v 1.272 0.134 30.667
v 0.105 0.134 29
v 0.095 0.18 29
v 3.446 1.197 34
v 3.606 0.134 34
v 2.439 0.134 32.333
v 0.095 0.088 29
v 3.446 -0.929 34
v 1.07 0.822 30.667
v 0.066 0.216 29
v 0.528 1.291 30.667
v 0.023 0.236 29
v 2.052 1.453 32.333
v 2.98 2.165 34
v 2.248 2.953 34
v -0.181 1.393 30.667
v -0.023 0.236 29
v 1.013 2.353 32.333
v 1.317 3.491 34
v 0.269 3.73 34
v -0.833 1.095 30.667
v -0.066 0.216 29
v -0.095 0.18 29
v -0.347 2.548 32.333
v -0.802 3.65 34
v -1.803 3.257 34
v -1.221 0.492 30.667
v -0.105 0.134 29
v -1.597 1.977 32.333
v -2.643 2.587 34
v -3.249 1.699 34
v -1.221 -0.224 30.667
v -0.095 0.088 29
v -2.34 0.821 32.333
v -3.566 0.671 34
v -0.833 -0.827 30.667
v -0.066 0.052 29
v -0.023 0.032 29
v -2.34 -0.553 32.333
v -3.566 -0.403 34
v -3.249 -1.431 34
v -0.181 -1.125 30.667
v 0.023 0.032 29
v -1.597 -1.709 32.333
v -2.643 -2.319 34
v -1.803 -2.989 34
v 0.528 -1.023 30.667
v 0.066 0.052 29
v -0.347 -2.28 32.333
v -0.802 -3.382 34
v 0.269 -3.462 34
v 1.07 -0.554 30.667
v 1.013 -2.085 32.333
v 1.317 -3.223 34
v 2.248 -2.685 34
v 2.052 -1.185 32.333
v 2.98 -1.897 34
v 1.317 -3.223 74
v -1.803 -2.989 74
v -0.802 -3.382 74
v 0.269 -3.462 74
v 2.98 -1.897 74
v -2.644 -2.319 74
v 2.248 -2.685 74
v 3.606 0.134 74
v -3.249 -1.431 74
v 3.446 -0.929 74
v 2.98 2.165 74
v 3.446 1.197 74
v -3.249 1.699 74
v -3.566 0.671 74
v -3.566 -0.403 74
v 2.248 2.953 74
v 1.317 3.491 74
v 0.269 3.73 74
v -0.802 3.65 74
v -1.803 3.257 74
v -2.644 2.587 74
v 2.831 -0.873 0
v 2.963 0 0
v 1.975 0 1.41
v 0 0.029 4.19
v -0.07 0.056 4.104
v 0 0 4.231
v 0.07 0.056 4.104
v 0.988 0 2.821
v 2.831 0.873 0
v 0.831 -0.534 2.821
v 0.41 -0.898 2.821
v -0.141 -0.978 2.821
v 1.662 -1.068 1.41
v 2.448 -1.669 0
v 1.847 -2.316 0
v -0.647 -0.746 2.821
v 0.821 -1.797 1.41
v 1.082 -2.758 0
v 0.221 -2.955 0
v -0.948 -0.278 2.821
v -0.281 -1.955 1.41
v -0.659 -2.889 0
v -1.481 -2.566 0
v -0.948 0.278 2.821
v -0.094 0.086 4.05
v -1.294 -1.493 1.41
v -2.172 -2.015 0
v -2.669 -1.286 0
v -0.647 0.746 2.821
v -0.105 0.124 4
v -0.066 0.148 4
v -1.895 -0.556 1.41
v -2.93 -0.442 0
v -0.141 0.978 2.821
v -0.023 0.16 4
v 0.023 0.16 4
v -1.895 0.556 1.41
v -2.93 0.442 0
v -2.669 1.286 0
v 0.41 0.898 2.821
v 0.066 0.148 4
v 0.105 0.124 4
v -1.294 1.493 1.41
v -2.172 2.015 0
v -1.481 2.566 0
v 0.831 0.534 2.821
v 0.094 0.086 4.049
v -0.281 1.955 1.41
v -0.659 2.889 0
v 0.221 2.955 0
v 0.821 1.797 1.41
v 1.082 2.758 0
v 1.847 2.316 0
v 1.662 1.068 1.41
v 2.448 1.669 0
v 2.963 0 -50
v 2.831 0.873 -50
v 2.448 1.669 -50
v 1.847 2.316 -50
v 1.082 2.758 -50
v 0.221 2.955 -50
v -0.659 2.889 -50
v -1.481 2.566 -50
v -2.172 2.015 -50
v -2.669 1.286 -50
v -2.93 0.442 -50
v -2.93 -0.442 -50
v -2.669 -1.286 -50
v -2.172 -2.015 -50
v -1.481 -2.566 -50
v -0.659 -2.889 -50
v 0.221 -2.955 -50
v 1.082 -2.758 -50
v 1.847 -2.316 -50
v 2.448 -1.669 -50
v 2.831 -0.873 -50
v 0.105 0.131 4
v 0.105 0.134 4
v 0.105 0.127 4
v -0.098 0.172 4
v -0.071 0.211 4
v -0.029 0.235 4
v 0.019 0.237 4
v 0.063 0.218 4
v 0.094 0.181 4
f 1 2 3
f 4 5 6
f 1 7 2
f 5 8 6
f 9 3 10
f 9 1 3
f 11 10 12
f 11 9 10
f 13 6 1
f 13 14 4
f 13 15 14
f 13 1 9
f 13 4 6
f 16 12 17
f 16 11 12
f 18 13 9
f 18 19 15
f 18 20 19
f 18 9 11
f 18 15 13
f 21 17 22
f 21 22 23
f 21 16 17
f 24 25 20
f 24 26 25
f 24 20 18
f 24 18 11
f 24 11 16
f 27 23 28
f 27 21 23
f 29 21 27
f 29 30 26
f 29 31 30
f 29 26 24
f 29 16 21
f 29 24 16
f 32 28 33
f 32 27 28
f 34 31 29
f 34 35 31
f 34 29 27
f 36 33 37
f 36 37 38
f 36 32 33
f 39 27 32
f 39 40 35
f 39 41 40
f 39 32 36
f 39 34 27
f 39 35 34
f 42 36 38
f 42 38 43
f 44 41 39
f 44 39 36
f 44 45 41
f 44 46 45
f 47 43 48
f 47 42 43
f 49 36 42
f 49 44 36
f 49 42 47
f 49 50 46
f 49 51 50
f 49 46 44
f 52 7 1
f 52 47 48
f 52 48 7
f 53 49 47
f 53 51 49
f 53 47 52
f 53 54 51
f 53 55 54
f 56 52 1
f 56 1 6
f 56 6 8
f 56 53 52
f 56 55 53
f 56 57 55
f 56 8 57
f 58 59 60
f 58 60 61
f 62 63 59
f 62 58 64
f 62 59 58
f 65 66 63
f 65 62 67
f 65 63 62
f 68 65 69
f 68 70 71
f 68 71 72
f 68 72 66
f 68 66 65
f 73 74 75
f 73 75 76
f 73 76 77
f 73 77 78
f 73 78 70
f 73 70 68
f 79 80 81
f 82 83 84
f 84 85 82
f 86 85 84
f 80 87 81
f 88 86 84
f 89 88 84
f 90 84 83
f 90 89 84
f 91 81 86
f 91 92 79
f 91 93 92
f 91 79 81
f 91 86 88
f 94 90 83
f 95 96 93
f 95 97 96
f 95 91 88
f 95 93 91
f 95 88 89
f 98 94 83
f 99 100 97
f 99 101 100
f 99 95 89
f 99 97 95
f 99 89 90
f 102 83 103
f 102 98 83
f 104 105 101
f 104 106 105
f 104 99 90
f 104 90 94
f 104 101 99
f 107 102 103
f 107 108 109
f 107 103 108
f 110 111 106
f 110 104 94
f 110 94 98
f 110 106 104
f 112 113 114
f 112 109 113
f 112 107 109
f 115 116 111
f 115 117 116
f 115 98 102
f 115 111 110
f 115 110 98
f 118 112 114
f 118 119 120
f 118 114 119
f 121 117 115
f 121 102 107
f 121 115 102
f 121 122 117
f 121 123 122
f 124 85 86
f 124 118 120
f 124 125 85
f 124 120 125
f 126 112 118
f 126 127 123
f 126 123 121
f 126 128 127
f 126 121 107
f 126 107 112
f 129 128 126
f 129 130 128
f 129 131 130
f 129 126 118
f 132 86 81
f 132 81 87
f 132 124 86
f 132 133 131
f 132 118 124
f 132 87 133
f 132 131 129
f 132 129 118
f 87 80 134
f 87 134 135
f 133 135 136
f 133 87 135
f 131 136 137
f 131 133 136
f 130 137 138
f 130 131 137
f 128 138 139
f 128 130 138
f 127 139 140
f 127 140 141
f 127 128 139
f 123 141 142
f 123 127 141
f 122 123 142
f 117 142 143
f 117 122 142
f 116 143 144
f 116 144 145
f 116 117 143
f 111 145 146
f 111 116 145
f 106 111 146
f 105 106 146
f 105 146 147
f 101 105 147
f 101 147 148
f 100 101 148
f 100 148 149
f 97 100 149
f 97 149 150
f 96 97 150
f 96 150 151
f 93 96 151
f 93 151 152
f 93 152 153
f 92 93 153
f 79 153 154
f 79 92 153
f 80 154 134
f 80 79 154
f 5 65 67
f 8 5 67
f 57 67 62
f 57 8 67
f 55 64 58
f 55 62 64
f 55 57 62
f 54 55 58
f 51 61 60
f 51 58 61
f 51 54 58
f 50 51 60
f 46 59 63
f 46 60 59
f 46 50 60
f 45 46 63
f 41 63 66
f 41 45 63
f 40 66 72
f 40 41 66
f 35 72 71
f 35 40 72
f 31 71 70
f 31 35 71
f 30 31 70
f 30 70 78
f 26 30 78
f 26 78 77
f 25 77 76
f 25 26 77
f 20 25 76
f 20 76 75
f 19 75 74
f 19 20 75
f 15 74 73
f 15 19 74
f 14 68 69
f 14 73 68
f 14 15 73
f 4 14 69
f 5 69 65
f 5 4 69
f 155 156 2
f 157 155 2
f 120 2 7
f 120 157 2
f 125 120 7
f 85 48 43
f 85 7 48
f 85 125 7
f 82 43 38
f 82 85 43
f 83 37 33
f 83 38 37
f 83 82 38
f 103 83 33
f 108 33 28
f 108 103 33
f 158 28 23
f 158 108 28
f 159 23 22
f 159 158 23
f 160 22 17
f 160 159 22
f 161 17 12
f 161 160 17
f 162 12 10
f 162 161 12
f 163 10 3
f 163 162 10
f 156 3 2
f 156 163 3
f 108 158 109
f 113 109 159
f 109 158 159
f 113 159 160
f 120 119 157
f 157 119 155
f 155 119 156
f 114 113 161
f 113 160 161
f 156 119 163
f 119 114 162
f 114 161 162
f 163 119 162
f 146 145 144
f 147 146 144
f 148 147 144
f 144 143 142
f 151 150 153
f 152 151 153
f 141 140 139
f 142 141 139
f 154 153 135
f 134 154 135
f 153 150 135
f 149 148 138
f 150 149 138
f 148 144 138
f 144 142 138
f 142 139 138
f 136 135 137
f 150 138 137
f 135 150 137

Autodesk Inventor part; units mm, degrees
ref_plane "YZ Plane" through (0, 0, 0) normal (1, 0, 0) x (0, 1, 0)
ref_plane "XZ Plane" through (0, 0, 0) normal (0, 1, 0) x (-1, 0, 0)
ref_plane "XY Plane" through (0, 0, 0) normal (0, 0, 1) x (1, 0, 0)
sketch "Sketch1" plane through (0, 0, 0) normal (0, 0, 1) x (1, 0, 0)
  circle A0 centre (0, 0) radius 2.9629 projected
  point P0 (0, 0)
extrude "Extrusion1" add sketch "Sketch1" against normal blind 50
sketch "Sketch2" plane through (0, 0, 0) normal (0, 0, 1) x (1, 0, 0)
  circle A0 centre (0, 0) radius 2.9629 projected
  point P0 (0, 0)
extrude "Extrusion2" add sketch "Sketch2" along normal blind 50 draft -35
ref_plane "Work Plane1" through (0, 0, 4) normal (0, 0, 1) x (1, 0, 0)
sketch "Sketch3" plane through (0, 0, 4) normal (0, 0, 1) x (1, 0, 0)
  circle A0 centre (0, 0) radius 2.9629 projected
  circle A1 centre (0, 0.134) radius 0.1051
  point P0 (0, 0)
extrude "Extrusion3" add sketch "Sketch3" along normal blind 25 contours A1
sketch "Sketch4" plane through (0, 0.134, 29) normal (0, 0, 1) x (1, 0, 0)
  circle A0 centre (0, 0) radius 0.1051 projected
  point P0 (0, -0.134)
extrude "Extrusion4" add sketch "Sketch4" along normal blind 5 draft 35
sketch "Sketch5" plane through (0, 0.134, 34) normal (0, 0, 1) x (1, 0, 0)
  circle A0 centre (0, 0) radius 3.6062 projected
  point P0 (0, -0.134)
extrude "Extrusion5" add sketch "Sketch5" along normal blind 40
properties part number "00_Laser_coupling"
